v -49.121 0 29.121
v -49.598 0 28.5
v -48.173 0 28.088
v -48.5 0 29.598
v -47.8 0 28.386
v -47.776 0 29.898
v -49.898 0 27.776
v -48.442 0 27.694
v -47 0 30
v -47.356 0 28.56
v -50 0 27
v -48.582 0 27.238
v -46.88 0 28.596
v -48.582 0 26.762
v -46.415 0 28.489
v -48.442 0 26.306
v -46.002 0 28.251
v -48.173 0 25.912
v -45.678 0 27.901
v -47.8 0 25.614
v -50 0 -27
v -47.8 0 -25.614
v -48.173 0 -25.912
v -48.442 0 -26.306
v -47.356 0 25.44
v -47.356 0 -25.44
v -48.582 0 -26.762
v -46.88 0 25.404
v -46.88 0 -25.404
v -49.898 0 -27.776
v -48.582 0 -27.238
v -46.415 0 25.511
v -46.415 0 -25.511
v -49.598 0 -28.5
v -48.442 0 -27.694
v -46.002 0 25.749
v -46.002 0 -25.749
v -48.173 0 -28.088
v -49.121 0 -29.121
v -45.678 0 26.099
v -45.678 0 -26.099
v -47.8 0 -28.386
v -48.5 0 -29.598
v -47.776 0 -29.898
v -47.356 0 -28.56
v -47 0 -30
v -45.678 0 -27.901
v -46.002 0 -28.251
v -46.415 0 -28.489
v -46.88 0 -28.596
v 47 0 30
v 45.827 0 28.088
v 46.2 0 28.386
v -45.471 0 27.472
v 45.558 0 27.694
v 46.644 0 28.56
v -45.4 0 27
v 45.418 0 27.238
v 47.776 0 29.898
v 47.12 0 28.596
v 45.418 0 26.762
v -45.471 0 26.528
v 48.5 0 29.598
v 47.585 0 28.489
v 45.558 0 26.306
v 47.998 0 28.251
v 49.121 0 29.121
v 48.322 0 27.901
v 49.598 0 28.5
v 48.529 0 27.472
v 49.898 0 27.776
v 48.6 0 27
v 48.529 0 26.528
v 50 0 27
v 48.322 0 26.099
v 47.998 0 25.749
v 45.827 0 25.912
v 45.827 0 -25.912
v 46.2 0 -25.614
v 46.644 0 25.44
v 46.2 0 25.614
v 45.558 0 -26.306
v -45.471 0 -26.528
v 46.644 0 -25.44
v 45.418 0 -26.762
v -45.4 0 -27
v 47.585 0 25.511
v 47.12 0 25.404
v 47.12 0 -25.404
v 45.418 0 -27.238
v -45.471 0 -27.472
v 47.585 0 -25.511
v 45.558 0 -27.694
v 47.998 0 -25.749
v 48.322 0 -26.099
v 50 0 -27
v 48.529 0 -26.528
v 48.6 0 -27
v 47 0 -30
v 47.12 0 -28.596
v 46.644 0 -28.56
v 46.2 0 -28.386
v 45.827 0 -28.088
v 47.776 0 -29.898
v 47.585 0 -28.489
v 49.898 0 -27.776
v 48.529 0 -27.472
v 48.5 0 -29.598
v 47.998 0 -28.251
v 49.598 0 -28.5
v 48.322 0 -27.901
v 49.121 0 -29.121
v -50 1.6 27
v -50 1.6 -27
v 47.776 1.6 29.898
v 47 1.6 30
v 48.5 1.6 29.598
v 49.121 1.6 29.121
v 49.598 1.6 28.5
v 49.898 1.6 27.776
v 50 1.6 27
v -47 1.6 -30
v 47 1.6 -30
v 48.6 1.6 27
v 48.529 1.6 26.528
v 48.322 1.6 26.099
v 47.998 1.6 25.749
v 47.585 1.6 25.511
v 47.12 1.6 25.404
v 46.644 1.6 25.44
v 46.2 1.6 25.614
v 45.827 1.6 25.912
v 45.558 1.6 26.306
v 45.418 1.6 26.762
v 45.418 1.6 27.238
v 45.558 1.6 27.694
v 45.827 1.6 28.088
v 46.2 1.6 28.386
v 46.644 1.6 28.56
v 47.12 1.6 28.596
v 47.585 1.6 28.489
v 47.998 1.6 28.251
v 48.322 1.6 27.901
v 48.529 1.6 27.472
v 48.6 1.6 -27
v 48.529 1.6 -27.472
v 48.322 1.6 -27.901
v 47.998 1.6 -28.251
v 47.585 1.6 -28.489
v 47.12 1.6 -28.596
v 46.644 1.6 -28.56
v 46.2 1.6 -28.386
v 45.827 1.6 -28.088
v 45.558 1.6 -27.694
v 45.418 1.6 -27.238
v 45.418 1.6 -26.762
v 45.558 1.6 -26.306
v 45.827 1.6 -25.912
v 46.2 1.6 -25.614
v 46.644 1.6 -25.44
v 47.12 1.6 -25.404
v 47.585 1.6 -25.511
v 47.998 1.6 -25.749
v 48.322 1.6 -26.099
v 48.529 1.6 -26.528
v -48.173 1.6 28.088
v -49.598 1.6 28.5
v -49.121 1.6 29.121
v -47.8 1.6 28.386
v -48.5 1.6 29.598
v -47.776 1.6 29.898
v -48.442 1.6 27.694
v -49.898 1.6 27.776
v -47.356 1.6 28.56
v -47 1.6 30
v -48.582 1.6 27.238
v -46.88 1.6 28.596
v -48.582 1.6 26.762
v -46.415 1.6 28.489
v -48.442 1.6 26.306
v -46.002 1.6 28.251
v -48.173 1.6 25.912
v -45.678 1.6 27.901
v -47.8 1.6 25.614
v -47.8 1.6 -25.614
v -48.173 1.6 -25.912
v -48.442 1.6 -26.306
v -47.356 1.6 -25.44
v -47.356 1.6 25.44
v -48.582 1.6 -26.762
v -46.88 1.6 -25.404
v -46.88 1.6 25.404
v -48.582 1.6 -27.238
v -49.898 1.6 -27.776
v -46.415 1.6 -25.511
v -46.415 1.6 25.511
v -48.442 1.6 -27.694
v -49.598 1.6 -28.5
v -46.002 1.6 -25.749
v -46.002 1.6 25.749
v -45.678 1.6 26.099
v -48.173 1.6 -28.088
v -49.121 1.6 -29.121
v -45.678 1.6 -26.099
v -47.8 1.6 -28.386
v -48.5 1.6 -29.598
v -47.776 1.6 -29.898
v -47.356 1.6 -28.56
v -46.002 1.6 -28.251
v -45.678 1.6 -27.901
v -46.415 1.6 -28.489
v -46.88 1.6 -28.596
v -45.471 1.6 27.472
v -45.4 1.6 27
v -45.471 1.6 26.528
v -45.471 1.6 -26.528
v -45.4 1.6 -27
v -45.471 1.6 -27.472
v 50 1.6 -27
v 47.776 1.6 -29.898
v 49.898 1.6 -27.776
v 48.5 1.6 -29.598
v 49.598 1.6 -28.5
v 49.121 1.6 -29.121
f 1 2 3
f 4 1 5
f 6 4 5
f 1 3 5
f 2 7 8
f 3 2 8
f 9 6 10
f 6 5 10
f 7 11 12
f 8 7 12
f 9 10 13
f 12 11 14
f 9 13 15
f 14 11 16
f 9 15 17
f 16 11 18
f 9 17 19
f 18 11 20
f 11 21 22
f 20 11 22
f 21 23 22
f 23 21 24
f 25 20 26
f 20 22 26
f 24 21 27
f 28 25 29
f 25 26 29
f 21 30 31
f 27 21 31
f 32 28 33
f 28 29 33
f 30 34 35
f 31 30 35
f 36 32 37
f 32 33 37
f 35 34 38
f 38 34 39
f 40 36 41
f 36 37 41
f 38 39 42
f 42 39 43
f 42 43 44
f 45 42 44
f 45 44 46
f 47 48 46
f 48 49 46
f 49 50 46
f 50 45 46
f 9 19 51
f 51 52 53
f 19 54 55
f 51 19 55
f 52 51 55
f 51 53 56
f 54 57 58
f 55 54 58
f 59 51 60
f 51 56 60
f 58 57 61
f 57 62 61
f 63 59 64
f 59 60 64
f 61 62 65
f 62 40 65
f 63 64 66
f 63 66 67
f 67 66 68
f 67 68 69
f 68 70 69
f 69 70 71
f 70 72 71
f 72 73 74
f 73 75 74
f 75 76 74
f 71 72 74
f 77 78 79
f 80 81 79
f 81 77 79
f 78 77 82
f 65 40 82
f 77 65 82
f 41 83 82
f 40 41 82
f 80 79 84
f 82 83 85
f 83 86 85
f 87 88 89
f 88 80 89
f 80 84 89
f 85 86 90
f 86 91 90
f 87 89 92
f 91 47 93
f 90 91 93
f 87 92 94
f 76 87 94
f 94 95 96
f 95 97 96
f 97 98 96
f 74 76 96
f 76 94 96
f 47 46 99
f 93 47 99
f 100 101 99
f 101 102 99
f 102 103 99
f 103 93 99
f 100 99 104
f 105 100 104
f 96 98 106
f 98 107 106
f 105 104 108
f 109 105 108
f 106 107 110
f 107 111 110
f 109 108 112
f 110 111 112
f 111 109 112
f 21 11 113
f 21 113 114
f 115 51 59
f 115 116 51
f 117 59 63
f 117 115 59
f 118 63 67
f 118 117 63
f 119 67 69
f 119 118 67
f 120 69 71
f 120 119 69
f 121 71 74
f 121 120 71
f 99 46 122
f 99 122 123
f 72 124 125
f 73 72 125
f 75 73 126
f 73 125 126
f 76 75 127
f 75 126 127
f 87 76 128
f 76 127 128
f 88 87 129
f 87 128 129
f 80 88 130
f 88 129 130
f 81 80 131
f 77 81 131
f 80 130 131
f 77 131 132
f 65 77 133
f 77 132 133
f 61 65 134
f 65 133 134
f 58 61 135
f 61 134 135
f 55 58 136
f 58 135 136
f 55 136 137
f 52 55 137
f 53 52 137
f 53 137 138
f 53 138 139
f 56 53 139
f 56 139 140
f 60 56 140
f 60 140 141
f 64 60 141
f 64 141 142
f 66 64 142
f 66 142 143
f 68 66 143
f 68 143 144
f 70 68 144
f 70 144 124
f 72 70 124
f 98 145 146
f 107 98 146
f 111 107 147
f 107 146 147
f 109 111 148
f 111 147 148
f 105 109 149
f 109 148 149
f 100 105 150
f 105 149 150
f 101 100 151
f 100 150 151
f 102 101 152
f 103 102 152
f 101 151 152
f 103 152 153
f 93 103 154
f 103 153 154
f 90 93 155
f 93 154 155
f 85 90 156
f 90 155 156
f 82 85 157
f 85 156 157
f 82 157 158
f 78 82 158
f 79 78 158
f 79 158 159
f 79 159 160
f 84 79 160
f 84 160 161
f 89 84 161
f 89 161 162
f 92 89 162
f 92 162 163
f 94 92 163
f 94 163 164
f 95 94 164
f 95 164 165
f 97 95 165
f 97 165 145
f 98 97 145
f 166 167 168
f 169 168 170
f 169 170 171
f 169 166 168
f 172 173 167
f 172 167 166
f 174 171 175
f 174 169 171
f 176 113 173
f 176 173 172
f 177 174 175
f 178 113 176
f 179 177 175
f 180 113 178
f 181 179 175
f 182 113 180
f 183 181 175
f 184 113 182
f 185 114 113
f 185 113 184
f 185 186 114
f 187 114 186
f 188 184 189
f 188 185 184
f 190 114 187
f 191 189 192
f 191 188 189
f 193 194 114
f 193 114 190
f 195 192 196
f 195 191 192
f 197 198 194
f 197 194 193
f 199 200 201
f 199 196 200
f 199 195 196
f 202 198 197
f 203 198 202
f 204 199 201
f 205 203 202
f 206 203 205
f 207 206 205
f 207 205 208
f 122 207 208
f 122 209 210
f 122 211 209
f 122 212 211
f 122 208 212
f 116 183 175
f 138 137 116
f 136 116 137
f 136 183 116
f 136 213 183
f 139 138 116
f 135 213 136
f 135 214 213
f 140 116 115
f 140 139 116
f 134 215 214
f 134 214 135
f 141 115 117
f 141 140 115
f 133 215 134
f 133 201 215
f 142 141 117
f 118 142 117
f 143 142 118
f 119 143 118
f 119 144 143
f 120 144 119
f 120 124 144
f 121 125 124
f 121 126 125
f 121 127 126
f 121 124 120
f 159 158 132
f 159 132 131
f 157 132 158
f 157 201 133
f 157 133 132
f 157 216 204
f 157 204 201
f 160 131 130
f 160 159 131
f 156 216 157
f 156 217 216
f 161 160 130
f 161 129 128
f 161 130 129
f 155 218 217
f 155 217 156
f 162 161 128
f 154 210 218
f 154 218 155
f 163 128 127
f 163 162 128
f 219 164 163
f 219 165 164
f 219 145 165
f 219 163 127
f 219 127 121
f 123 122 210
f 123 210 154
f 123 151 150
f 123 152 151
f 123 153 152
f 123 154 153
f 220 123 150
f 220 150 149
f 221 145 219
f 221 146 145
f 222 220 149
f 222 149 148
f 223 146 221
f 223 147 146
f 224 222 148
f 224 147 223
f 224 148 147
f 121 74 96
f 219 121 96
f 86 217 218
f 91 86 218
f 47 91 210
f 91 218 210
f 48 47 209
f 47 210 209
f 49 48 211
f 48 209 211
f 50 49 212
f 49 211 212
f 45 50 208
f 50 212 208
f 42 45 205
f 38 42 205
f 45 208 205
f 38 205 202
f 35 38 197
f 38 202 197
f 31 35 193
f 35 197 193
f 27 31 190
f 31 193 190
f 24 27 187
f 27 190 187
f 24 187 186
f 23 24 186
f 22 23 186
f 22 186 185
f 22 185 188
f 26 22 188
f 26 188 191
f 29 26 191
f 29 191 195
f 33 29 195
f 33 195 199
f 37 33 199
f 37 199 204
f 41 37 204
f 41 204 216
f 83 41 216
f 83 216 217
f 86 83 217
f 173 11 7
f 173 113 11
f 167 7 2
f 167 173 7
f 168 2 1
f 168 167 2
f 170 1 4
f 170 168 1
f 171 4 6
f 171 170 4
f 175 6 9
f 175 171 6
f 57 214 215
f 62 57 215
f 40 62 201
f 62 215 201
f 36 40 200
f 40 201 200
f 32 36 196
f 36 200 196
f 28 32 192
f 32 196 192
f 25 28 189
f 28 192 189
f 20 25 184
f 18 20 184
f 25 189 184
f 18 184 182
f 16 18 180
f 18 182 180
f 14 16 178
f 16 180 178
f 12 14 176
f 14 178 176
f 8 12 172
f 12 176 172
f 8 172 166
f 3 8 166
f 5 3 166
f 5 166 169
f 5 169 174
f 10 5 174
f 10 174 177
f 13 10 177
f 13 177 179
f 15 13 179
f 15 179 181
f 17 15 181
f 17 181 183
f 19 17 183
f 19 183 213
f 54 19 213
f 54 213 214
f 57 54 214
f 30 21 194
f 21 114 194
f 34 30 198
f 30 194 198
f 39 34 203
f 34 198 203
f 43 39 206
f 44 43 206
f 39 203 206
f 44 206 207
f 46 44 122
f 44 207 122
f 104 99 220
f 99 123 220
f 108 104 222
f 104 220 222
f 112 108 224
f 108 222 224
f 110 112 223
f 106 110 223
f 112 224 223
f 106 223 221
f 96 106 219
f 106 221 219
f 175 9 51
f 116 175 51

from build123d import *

# Parameters (mm, degrees)
SKETCH_1_W          = 100
SKETCH_1_H          = 60
EXTRUDE_1_DEPTH     = 1.6
SKETCH_2_R          = 1.6
CUT_EXTRUDE_1_DEPTH = 2.6
FILLET_1_R          = 3


with BuildPart() as part:
    # 草图1 → 凸台-拉伸1 (new body)
    with BuildSketch(Plane(origin=(0, 0, 0), x_dir=(1, 0, 0), z_dir=(0, 1, 0))):
        Rectangle(SKETCH_1_W, SKETCH_1_H)
    extrude(amount=EXTRUDE_1_DEPTH)

    # 草图2 → 切除-拉伸1 (cut, through all)
    with BuildSketch(Plane(origin=(0, 1.6, 0), x_dir=(1, 0, 0), z_dir=(0, 1, 0))):
        with Locations((-47, 27)):
            Circle(SKETCH_2_R)
        with Locations((47, 27)):
            Circle(SKETCH_2_R)
        with Locations((47, -27)):
            Circle(SKETCH_2_R)
        with Locations((-47, -27)):
            Circle(SKETCH_2_R)
    extrude(amount=-CUT_EXTRUDE_1_DEPTH, mode=Mode.SUBTRACT)

    # 圆角1
    fillet_1_edges = [part.edges().sort_by_distance(p)[0] for p in [
        (-50, 0.8, 30),
        (-50, 0.8, -30),
        (50, 0.8, -30),
        (50, 0.8, 30),
    ]]
    fillet(fillet_1_edges, radius=FILLET_1_R)


solid = part.part
